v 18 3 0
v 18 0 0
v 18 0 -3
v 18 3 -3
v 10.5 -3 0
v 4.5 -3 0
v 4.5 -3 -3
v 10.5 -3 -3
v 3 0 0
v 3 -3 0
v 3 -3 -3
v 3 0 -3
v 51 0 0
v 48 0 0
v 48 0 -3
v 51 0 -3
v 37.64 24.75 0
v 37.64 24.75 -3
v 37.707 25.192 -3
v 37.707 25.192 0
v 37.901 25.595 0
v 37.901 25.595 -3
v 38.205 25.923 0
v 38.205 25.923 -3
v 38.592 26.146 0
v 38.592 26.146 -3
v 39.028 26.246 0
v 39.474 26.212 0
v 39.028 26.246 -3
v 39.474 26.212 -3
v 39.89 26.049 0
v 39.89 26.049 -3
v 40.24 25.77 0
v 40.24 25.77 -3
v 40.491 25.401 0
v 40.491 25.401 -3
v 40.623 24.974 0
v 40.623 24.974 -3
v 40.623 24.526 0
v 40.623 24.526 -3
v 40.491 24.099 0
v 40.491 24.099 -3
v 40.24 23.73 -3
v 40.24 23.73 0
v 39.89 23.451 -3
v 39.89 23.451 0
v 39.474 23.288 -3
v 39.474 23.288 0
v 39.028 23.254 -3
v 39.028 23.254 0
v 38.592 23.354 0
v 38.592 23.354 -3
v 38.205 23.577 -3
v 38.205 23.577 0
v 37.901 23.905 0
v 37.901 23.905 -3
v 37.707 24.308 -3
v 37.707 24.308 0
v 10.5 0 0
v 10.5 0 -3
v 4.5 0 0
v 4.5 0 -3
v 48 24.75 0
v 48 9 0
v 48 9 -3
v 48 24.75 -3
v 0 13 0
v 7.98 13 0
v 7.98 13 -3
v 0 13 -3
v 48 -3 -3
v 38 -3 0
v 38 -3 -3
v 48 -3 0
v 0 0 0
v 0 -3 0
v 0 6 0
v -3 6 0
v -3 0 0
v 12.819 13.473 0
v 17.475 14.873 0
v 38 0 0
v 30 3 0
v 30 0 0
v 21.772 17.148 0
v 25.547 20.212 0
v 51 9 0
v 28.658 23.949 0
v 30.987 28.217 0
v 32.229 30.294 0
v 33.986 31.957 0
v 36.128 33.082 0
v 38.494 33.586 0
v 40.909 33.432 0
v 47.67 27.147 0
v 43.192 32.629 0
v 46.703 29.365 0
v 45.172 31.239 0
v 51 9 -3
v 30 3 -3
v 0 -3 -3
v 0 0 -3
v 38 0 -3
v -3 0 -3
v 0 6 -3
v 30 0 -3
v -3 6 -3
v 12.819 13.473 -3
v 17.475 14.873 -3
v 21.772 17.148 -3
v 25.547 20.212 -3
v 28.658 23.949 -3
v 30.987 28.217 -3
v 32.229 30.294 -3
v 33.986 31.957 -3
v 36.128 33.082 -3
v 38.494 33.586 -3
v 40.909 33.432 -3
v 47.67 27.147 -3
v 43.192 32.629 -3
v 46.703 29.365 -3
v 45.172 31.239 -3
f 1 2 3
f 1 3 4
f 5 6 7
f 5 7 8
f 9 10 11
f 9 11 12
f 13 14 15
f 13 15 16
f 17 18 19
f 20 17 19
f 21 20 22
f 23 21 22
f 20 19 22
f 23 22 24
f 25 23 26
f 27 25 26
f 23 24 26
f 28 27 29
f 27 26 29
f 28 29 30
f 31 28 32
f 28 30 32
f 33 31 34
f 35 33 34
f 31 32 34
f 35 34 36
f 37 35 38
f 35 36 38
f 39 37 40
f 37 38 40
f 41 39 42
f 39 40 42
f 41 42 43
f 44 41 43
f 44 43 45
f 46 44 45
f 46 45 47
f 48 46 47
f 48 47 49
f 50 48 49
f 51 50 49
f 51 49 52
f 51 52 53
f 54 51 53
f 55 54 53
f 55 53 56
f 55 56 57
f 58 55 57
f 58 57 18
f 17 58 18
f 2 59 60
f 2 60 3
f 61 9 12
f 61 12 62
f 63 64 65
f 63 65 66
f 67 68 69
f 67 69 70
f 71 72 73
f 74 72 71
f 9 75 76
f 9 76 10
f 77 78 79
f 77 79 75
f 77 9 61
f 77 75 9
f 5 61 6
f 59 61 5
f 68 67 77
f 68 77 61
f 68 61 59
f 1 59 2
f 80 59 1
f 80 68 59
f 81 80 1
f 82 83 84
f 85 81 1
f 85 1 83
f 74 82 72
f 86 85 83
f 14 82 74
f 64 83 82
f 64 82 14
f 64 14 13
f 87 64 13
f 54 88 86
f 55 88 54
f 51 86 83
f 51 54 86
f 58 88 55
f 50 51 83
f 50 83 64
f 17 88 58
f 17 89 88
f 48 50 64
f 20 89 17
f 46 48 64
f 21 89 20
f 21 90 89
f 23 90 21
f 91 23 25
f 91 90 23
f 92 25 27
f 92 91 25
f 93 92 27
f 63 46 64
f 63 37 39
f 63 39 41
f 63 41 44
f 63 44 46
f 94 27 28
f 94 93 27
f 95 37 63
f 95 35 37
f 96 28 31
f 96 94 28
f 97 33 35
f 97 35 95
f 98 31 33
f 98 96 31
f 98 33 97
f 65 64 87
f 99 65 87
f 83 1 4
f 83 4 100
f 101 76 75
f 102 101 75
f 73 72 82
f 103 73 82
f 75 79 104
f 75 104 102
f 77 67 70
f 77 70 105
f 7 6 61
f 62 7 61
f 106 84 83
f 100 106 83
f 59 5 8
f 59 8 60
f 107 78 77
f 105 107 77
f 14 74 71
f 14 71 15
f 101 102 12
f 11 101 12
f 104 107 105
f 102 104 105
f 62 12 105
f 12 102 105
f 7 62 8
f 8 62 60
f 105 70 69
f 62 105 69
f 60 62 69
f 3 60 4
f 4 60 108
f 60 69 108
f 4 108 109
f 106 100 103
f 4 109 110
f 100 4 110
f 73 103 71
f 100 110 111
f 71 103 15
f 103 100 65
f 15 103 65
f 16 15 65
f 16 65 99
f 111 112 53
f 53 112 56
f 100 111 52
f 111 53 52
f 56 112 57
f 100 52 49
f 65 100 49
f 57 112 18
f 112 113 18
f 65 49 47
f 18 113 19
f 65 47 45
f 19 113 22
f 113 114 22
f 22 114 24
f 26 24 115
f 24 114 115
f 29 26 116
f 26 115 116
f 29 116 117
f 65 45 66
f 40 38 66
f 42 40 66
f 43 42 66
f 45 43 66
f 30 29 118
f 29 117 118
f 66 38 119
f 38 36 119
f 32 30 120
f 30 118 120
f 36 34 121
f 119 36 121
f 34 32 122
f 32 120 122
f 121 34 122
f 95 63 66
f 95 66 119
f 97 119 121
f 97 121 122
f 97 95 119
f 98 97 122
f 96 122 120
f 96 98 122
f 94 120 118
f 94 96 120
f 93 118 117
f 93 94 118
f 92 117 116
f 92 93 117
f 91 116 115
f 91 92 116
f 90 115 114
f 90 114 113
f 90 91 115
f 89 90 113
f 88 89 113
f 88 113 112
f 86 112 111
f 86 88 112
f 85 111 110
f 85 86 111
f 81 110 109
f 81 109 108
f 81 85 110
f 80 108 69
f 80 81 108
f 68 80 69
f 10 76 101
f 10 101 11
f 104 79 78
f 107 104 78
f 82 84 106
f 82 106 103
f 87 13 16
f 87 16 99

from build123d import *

# Parameters (mm, degrees)
RESSALTO_EXTRUS_O1_DEPTH   = 3
ESBO_O2_W                  = 12
ESBO_O2_H                  = 3
CORTE_EXTRUS_O1_DEPTH      = 59.67394737
FURO_DE_DI_METRO_3_0_3_1_D = 3
ESBO_O5_W                  = 3
ESBO_O5_H                  = 6
ESBO_O5_H_2                = 3
ESBO_O5_W_2                = 6
ESBO_O5_H_3                = 9
ESBO_O5_W_3                = 10
RESSALTO_EXTRUS_O2_DEPTH   = 3


with BuildPart() as part:
    # Esboço1 → Ressalto-extrusão1 (new body)
    with BuildSketch(Plane.XY):
        with BuildLine():
            Line((0, 0), (48, 0))
            Line((48, 0), (48, 24.75))
            ThreePointArc((48, 24.75), (40.90916402, 33.431570058), (30.986533031, 28.217070289))
            ThreePointArc((30.986533031, 28.217070289), (21.771923029, 17.148462374), (7.980136393, 13))
            Line((7.980136393, 13), (0, 13))
            Line((0, 13), (0, 0))
        make_face()
    extrude(amount=-RESSALTO_EXTRUS_O1_DEPTH)

    # Esboço2 → Corte-extrusão1 (cut, through all)
    with BuildSketch(Plane.XY):
        with Locations((24, 1.5)):
            Rectangle(ESBO_O2_W, ESBO_O2_H)
    extrude(amount=-CORTE_EXTRUS_O1_DEPTH, mode=Mode.SUBTRACT)

    # Furo de diâmetro Ø3.0 (3)1 (through all)
    with Locations(Plane.XY):
        with Locations((39.14, 24.75)):
            Hole(FURO_DE_DI_METRO_3_0_3_1_D / 2)

    # Esboço5 → Ressalto-extrusão2 (add, through all)
    with BuildSketch(Plane.XY):
        with Locations((-1.5, 3)):
            Rectangle(ESBO_O5_W, ESBO_O5_H)
        with Locations((1.5, -1.5)):
            Rectangle(ESBO_O5_W, ESBO_O5_H_2)
        with Locations((7.5, -1.5)):
            Rectangle(ESBO_O5_W_2, ESBO_O5_H_2)
        with Locations((49.5, 4.5)):
            Rectangle(ESBO_O5_W, ESBO_O5_H_3)
        with Locations((43, -1.5)):
            Rectangle(ESBO_O5_W_3, ESBO_O5_H_2)
    extrude(amount=-RESSALTO_EXTRUS_O2_DEPTH)


solid = part.part
